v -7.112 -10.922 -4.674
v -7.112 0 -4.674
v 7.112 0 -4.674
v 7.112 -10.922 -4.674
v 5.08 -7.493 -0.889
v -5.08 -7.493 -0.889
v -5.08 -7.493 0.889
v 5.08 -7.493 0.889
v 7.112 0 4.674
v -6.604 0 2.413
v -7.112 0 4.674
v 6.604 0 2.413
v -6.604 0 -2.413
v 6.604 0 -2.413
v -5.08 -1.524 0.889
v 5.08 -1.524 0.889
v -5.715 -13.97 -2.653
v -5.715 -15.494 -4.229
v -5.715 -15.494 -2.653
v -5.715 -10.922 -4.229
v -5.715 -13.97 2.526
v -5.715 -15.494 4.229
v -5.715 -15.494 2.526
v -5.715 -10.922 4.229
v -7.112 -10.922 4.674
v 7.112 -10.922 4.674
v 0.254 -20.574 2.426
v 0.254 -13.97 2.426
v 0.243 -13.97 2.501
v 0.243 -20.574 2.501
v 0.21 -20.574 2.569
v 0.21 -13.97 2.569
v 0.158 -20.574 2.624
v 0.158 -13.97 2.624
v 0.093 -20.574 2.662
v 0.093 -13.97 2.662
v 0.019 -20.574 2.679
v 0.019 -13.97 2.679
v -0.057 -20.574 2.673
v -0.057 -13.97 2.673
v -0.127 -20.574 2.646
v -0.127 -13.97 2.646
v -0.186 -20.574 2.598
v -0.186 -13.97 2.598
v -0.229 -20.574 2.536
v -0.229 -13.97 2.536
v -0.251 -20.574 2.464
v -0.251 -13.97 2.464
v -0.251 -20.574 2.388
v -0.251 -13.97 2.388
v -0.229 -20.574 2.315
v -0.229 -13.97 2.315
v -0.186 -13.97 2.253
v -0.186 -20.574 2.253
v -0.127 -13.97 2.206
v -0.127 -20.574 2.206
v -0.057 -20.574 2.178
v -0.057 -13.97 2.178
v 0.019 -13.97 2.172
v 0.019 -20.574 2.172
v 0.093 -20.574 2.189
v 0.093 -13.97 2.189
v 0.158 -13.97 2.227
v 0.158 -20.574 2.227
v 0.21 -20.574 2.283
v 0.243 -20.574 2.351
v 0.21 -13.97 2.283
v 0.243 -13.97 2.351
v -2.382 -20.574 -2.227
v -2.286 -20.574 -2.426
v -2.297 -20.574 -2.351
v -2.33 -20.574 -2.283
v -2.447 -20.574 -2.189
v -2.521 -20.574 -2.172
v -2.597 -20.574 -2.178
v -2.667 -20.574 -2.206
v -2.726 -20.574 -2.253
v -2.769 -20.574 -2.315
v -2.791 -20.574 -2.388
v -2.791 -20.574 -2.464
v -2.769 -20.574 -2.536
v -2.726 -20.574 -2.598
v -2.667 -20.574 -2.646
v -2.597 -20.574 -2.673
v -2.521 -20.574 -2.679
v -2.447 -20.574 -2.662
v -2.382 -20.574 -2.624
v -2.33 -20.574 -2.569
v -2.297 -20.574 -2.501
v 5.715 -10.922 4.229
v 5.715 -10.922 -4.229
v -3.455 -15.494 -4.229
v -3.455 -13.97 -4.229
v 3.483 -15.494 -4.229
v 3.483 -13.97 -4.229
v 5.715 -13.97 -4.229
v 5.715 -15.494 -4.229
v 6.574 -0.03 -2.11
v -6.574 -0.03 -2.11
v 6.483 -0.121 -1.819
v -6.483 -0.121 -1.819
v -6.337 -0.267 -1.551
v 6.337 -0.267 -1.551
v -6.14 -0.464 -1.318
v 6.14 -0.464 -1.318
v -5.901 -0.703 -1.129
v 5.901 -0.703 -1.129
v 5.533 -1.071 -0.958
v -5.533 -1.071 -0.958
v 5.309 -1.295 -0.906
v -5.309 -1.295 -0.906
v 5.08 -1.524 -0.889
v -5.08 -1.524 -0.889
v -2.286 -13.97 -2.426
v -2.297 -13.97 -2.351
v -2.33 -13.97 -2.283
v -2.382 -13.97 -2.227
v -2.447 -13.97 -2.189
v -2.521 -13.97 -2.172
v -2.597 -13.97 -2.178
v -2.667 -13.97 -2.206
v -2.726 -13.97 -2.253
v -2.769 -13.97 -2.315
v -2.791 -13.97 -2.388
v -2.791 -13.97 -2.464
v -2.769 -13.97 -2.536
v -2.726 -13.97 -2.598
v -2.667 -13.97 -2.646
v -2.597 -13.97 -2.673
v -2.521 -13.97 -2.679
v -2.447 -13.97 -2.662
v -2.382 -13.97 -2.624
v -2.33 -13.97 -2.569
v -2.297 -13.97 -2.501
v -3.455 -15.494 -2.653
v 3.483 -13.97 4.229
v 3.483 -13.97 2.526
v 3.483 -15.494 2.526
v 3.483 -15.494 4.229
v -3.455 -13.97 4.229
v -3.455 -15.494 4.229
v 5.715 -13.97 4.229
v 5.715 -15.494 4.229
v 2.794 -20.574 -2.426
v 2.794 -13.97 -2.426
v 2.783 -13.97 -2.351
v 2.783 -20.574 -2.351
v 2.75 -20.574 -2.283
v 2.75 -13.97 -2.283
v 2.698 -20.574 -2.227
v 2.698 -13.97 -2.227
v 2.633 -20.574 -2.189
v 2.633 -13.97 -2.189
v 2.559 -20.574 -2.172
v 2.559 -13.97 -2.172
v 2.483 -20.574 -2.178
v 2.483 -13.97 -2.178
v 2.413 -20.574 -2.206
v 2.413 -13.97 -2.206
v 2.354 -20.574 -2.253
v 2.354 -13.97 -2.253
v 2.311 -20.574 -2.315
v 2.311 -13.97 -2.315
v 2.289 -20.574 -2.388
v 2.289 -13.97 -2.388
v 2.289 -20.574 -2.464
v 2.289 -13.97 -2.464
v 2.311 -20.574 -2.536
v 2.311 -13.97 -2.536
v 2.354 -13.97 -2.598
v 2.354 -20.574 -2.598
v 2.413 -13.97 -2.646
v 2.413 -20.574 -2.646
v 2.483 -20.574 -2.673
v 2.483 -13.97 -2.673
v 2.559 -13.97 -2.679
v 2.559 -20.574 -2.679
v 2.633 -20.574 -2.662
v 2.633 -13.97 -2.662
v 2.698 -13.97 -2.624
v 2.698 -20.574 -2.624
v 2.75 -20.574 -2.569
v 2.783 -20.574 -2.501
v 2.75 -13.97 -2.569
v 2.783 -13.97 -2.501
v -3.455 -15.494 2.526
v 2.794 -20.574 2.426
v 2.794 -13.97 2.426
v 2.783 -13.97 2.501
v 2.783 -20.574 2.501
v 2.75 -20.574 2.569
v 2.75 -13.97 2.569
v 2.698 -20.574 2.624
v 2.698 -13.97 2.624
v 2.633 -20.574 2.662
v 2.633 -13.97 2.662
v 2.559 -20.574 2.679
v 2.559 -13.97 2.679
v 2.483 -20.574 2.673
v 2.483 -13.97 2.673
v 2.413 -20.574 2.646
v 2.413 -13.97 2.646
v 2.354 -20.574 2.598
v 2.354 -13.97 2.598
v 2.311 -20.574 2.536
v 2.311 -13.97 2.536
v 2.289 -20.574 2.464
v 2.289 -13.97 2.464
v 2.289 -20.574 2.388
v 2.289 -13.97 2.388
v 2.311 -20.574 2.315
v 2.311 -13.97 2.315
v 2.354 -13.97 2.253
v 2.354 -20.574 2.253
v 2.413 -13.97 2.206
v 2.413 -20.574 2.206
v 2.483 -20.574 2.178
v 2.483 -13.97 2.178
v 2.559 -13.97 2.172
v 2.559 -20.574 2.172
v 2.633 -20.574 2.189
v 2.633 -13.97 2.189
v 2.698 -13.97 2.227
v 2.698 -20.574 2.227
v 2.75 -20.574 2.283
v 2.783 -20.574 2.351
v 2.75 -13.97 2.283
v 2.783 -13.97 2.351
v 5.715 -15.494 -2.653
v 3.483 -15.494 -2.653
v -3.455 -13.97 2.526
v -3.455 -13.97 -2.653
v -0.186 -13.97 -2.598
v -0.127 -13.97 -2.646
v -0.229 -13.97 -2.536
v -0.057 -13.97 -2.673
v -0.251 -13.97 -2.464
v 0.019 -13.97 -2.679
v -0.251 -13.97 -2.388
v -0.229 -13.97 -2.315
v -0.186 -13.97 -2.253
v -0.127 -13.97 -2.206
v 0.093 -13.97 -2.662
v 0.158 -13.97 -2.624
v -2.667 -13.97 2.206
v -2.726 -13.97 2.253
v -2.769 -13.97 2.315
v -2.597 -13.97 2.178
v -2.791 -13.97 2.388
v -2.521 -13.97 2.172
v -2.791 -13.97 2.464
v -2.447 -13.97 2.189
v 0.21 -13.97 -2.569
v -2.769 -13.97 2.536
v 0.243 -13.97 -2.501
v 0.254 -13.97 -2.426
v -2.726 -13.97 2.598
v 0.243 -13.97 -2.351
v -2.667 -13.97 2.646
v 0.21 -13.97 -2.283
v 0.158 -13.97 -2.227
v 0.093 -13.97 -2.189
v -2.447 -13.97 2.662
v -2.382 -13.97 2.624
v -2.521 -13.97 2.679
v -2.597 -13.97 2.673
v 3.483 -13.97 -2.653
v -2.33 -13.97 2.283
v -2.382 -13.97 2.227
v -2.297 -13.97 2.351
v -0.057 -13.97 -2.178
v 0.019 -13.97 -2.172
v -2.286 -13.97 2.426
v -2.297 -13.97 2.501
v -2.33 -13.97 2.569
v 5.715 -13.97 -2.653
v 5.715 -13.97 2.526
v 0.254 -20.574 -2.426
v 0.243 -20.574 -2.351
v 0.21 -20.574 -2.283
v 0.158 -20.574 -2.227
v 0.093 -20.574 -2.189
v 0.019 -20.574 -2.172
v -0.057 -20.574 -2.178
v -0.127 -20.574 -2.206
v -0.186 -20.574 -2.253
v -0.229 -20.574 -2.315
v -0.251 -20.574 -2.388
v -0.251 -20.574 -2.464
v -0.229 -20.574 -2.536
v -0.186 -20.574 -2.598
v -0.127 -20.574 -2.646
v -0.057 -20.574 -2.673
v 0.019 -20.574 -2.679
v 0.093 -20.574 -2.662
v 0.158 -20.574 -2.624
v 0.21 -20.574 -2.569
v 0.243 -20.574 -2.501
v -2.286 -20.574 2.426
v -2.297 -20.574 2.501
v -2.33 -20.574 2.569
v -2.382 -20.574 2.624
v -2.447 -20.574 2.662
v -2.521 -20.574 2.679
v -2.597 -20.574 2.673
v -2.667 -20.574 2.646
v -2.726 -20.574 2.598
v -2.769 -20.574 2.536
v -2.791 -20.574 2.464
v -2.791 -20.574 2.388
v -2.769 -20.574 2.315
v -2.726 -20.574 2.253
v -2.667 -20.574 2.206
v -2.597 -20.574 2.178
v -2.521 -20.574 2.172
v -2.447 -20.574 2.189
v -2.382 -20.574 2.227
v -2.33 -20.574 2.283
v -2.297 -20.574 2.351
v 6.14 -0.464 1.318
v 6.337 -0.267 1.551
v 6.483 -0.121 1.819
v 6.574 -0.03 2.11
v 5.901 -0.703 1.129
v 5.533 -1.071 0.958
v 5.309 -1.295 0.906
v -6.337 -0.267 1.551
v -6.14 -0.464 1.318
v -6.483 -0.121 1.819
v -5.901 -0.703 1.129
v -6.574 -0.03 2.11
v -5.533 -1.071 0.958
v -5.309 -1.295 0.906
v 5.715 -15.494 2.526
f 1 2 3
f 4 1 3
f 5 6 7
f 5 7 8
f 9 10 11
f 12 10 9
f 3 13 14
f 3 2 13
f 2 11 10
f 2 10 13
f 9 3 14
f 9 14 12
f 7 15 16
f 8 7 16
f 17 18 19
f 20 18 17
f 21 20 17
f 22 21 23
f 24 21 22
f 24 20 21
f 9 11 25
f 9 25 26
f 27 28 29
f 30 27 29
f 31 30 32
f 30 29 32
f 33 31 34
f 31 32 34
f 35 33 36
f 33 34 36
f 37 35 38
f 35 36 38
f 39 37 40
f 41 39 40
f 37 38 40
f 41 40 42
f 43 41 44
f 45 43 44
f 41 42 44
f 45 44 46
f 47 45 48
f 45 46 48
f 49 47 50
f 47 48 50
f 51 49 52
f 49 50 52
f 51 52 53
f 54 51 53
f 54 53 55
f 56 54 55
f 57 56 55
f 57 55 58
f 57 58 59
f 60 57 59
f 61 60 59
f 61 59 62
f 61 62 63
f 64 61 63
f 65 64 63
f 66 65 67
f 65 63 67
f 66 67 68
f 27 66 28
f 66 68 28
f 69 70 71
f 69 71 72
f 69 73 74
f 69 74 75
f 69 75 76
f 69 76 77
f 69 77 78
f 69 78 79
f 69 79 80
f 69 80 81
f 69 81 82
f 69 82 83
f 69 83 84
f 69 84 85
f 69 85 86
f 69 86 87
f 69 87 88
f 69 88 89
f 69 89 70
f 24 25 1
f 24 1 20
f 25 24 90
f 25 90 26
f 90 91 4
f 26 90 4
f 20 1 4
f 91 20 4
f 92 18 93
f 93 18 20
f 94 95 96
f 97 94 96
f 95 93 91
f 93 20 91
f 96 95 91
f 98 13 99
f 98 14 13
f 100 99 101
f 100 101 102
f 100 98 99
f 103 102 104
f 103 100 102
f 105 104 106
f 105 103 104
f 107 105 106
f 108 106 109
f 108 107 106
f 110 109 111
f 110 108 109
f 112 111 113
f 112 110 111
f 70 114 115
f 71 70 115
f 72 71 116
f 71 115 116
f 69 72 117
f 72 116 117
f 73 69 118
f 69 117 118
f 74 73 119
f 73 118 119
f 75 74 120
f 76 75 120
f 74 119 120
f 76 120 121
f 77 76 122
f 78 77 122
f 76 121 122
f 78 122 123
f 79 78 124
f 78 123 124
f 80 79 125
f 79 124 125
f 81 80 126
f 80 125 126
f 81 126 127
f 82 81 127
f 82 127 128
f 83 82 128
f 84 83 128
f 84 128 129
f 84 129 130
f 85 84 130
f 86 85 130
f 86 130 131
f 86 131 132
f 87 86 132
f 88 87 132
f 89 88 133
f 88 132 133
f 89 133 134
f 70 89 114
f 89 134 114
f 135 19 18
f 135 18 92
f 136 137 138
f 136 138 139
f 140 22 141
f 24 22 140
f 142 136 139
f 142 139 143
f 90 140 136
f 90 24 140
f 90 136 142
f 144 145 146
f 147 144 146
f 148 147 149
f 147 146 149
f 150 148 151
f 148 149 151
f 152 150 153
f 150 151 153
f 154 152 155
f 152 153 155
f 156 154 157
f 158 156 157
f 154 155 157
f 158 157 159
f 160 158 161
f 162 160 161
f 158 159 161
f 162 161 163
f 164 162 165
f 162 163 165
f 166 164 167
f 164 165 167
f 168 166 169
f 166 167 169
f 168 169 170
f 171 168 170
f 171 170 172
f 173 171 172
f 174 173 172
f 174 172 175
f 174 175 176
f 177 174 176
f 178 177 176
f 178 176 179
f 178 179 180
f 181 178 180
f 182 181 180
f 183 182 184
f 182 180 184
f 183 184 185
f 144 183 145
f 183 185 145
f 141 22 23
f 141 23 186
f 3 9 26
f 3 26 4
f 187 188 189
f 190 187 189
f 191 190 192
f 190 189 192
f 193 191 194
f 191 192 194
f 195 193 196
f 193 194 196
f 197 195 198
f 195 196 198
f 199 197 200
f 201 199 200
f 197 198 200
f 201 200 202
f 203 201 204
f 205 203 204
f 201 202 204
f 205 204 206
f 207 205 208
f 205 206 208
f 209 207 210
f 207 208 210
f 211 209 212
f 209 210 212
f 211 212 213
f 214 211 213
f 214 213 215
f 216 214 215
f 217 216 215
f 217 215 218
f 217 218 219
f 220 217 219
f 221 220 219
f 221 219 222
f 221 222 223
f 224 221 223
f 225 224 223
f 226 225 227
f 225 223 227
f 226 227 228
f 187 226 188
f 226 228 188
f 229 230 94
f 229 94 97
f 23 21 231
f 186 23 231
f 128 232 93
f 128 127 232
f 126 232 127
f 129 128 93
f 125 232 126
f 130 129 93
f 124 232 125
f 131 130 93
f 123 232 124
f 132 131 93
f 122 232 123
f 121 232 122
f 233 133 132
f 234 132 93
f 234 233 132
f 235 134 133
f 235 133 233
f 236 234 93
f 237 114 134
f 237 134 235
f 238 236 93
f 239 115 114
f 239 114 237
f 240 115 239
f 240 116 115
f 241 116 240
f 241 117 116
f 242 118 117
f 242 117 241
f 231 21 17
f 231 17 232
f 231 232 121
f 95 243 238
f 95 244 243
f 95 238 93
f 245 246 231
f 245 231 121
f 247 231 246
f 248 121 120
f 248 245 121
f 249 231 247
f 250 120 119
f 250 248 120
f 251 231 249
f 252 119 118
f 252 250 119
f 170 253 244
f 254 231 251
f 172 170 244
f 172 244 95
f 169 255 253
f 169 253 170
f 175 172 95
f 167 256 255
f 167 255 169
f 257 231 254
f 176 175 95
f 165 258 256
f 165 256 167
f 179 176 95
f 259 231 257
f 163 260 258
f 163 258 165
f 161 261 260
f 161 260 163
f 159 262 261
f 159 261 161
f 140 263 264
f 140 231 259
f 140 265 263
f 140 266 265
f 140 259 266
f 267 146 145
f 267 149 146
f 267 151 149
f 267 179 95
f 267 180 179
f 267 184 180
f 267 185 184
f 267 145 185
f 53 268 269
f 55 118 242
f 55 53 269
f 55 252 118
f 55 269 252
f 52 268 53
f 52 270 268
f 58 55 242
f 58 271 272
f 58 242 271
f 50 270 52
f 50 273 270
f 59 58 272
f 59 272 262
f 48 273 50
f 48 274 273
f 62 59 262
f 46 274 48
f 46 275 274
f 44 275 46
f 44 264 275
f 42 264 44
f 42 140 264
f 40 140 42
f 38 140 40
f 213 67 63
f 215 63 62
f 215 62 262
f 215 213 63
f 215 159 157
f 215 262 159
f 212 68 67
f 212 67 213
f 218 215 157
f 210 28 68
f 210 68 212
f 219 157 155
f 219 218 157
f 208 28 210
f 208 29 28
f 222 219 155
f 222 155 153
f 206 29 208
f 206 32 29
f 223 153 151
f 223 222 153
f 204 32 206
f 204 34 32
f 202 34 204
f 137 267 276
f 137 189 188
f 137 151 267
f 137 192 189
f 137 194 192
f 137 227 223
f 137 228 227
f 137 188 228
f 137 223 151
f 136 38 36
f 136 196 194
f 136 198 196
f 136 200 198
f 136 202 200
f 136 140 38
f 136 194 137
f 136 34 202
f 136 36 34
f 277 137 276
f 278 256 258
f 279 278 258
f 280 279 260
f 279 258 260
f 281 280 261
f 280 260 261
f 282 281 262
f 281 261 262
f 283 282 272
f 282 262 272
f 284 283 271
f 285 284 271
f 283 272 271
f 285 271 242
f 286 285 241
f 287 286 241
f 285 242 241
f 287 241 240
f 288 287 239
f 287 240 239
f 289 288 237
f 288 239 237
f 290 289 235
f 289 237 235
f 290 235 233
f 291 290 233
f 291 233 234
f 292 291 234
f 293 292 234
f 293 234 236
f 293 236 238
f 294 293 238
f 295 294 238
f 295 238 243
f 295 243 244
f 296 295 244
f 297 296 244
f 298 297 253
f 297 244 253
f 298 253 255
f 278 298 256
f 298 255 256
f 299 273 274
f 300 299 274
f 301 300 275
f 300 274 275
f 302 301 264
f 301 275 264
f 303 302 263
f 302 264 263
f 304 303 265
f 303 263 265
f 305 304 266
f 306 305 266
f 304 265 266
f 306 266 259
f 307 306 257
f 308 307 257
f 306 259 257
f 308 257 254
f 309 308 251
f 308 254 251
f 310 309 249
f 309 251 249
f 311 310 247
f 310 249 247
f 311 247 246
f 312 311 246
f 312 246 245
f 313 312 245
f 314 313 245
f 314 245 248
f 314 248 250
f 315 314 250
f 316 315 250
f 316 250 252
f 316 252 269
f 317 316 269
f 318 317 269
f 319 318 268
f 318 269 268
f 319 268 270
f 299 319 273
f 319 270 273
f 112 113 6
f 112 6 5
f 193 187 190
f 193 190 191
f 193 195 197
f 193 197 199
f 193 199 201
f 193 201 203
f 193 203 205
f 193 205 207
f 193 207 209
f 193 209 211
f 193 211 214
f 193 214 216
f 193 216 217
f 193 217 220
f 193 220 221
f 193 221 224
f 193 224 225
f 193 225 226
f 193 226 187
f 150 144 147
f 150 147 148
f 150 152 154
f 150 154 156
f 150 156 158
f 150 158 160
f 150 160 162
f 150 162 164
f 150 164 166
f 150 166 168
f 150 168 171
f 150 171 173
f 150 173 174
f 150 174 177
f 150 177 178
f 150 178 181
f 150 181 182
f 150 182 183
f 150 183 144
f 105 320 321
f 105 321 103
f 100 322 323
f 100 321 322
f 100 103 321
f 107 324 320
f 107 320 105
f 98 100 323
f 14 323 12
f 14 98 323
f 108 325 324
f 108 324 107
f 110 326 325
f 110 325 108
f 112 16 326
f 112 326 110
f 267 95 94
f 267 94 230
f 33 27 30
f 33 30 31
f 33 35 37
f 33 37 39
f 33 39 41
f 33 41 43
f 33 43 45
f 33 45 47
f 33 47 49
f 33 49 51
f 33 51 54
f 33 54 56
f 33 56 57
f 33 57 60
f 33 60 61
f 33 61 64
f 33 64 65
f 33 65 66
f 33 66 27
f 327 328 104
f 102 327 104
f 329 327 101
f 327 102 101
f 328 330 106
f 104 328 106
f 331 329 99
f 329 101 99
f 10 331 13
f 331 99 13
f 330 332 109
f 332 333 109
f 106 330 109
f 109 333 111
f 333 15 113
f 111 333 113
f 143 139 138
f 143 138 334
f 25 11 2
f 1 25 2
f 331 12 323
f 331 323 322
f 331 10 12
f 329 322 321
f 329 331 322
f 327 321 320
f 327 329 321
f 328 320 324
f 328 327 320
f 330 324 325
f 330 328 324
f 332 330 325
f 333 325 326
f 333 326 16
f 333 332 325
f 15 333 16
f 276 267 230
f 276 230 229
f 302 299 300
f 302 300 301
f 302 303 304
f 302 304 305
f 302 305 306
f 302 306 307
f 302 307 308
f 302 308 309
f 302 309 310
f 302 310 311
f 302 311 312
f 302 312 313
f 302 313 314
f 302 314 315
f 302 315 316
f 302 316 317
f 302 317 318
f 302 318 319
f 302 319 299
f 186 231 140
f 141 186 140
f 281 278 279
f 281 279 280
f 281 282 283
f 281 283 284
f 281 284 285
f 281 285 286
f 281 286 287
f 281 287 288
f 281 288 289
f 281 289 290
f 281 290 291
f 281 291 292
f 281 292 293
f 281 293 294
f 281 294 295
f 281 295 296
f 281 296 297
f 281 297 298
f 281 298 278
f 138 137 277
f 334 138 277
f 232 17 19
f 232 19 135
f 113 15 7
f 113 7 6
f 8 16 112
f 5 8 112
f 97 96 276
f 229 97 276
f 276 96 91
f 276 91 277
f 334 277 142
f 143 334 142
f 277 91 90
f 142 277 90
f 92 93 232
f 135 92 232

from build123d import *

# Parameters (mm, degrees)
SKETCH1_W            = 14.224
SKETCH1_H            = 9.3472
BOSS_EXTRUDE1_DEPTH  = 10.922
SKETCH2_W            = 11.43
SKETCH2_H            = 8.458212498
BOSS_EXTRUDE2_DEPTH  = 3.048
SKETCH3_W            = 2.25993982
SKETCH3_H            = 1.702901352
SKETCH3_W_2          = 2.231792691
SKETCH3_H_2          = 1.576239268
BOSS_EXTRUDE3_DEPTH  = 1.524
SKETCH4_R            = 0.254
BOSS_EXTRUDE4_DEPTH  = 6.604
LPATTERN1_COUNT      = 3
LPATTERN1_PITCH      = 2.54
LPATTERN1_COUNT_DIR2 = 2
LPATTERN1_PITCH_DIR2 = 4.8514
SKETCH5_W            = 10.16
SKETCH5_H            = 1.778
CUT_EXTRUDE1_DEPTH   = 7.493
CHAMFER1_SIZE        = 1.524
FILLET1_R            = 1.524


with BuildPart() as part:
    # Sketch1 → Boss-Extrude1 (new body)
    with BuildSketch(Plane(origin=(0, 0, 0), x_dir=(1, 0, 0), z_dir=(0, 1, 0))):
        Rectangle(SKETCH1_W, SKETCH1_H)
    extrude(amount=-BOSS_EXTRUDE1_DEPTH)

    # Sketch2 → Boss-Extrude2 (add)
    with BuildSketch(Plane.XZ.offset(10.922)):
        Rectangle(SKETCH2_W, SKETCH2_H)
    extrude(amount=BOSS_EXTRUDE2_DEPTH)

    # Sketch3 → Boss-Extrude3 (add)
    with BuildSketch(Plane.XZ.offset(13.97)):
        with Locations((-4.58503009, 3.377655573)):
            Rectangle(SKETCH3_W, SKETCH3_H)
        with Locations((4.599103655, 3.377655573)):
            Rectangle(SKETCH3_W_2, SKETCH3_H)
        with Locations((4.599103655, -3.440986615)):
            Rectangle(SKETCH3_W_2, SKETCH3_H_2)
        with Locations((-4.58503009, -3.440986615)):
            Rectangle(SKETCH3_W, SKETCH3_H_2)
    extrude(amount=BOSS_EXTRUDE3_DEPTH)

    # Sketch4 → Boss-Extrude4 (add)
    with BuildSketch(Plane.XZ.offset(13.97)):
        with Locations((-2.54, -2.4257)):
            Circle(SKETCH4_R)
    boss_extrude4 = extrude(amount=BOSS_EXTRUDE4_DEPTH)

    # LPattern1: Boss-Extrude4 3 × 2
    with Locations(*[(i * LPATTERN1_PITCH, 0, j * LPATTERN1_PITCH_DIR2) for i in range(LPATTERN1_COUNT) for j in range(LPATTERN1_COUNT_DIR2) if (i, j) != (0, 0)]):
        add(boss_extrude4)

    # Sketch5 → Cut-Extrude1 (cut)
    with BuildSketch(Plane(origin=(0, 0, 0), x_dir=(1, 0, 0), z_dir=(0, 1, 0))):
        Rectangle(SKETCH5_W, SKETCH5_H)
    extrude(amount=-CUT_EXTRUDE1_DEPTH, mode=Mode.SUBTRACT)

    # Chamfer1
    chamfer1_edges = [part.edges().sort_by_distance(p)[0] for p in [
        (-5.08, 0, 0),
        (5.08, 0, 0),
    ]]
    chamfer(chamfer1_edges, length=CHAMFER1_SIZE)

    # Fillet1
    fillet1_edges = [part.edges().sort_by_distance(p)[0] for p in [
        (0, 0, 0.889),
        (0, 0, -0.889),
    ]]
    fillet(fillet1_edges, radius=FILLET1_R)


solid = part.part
